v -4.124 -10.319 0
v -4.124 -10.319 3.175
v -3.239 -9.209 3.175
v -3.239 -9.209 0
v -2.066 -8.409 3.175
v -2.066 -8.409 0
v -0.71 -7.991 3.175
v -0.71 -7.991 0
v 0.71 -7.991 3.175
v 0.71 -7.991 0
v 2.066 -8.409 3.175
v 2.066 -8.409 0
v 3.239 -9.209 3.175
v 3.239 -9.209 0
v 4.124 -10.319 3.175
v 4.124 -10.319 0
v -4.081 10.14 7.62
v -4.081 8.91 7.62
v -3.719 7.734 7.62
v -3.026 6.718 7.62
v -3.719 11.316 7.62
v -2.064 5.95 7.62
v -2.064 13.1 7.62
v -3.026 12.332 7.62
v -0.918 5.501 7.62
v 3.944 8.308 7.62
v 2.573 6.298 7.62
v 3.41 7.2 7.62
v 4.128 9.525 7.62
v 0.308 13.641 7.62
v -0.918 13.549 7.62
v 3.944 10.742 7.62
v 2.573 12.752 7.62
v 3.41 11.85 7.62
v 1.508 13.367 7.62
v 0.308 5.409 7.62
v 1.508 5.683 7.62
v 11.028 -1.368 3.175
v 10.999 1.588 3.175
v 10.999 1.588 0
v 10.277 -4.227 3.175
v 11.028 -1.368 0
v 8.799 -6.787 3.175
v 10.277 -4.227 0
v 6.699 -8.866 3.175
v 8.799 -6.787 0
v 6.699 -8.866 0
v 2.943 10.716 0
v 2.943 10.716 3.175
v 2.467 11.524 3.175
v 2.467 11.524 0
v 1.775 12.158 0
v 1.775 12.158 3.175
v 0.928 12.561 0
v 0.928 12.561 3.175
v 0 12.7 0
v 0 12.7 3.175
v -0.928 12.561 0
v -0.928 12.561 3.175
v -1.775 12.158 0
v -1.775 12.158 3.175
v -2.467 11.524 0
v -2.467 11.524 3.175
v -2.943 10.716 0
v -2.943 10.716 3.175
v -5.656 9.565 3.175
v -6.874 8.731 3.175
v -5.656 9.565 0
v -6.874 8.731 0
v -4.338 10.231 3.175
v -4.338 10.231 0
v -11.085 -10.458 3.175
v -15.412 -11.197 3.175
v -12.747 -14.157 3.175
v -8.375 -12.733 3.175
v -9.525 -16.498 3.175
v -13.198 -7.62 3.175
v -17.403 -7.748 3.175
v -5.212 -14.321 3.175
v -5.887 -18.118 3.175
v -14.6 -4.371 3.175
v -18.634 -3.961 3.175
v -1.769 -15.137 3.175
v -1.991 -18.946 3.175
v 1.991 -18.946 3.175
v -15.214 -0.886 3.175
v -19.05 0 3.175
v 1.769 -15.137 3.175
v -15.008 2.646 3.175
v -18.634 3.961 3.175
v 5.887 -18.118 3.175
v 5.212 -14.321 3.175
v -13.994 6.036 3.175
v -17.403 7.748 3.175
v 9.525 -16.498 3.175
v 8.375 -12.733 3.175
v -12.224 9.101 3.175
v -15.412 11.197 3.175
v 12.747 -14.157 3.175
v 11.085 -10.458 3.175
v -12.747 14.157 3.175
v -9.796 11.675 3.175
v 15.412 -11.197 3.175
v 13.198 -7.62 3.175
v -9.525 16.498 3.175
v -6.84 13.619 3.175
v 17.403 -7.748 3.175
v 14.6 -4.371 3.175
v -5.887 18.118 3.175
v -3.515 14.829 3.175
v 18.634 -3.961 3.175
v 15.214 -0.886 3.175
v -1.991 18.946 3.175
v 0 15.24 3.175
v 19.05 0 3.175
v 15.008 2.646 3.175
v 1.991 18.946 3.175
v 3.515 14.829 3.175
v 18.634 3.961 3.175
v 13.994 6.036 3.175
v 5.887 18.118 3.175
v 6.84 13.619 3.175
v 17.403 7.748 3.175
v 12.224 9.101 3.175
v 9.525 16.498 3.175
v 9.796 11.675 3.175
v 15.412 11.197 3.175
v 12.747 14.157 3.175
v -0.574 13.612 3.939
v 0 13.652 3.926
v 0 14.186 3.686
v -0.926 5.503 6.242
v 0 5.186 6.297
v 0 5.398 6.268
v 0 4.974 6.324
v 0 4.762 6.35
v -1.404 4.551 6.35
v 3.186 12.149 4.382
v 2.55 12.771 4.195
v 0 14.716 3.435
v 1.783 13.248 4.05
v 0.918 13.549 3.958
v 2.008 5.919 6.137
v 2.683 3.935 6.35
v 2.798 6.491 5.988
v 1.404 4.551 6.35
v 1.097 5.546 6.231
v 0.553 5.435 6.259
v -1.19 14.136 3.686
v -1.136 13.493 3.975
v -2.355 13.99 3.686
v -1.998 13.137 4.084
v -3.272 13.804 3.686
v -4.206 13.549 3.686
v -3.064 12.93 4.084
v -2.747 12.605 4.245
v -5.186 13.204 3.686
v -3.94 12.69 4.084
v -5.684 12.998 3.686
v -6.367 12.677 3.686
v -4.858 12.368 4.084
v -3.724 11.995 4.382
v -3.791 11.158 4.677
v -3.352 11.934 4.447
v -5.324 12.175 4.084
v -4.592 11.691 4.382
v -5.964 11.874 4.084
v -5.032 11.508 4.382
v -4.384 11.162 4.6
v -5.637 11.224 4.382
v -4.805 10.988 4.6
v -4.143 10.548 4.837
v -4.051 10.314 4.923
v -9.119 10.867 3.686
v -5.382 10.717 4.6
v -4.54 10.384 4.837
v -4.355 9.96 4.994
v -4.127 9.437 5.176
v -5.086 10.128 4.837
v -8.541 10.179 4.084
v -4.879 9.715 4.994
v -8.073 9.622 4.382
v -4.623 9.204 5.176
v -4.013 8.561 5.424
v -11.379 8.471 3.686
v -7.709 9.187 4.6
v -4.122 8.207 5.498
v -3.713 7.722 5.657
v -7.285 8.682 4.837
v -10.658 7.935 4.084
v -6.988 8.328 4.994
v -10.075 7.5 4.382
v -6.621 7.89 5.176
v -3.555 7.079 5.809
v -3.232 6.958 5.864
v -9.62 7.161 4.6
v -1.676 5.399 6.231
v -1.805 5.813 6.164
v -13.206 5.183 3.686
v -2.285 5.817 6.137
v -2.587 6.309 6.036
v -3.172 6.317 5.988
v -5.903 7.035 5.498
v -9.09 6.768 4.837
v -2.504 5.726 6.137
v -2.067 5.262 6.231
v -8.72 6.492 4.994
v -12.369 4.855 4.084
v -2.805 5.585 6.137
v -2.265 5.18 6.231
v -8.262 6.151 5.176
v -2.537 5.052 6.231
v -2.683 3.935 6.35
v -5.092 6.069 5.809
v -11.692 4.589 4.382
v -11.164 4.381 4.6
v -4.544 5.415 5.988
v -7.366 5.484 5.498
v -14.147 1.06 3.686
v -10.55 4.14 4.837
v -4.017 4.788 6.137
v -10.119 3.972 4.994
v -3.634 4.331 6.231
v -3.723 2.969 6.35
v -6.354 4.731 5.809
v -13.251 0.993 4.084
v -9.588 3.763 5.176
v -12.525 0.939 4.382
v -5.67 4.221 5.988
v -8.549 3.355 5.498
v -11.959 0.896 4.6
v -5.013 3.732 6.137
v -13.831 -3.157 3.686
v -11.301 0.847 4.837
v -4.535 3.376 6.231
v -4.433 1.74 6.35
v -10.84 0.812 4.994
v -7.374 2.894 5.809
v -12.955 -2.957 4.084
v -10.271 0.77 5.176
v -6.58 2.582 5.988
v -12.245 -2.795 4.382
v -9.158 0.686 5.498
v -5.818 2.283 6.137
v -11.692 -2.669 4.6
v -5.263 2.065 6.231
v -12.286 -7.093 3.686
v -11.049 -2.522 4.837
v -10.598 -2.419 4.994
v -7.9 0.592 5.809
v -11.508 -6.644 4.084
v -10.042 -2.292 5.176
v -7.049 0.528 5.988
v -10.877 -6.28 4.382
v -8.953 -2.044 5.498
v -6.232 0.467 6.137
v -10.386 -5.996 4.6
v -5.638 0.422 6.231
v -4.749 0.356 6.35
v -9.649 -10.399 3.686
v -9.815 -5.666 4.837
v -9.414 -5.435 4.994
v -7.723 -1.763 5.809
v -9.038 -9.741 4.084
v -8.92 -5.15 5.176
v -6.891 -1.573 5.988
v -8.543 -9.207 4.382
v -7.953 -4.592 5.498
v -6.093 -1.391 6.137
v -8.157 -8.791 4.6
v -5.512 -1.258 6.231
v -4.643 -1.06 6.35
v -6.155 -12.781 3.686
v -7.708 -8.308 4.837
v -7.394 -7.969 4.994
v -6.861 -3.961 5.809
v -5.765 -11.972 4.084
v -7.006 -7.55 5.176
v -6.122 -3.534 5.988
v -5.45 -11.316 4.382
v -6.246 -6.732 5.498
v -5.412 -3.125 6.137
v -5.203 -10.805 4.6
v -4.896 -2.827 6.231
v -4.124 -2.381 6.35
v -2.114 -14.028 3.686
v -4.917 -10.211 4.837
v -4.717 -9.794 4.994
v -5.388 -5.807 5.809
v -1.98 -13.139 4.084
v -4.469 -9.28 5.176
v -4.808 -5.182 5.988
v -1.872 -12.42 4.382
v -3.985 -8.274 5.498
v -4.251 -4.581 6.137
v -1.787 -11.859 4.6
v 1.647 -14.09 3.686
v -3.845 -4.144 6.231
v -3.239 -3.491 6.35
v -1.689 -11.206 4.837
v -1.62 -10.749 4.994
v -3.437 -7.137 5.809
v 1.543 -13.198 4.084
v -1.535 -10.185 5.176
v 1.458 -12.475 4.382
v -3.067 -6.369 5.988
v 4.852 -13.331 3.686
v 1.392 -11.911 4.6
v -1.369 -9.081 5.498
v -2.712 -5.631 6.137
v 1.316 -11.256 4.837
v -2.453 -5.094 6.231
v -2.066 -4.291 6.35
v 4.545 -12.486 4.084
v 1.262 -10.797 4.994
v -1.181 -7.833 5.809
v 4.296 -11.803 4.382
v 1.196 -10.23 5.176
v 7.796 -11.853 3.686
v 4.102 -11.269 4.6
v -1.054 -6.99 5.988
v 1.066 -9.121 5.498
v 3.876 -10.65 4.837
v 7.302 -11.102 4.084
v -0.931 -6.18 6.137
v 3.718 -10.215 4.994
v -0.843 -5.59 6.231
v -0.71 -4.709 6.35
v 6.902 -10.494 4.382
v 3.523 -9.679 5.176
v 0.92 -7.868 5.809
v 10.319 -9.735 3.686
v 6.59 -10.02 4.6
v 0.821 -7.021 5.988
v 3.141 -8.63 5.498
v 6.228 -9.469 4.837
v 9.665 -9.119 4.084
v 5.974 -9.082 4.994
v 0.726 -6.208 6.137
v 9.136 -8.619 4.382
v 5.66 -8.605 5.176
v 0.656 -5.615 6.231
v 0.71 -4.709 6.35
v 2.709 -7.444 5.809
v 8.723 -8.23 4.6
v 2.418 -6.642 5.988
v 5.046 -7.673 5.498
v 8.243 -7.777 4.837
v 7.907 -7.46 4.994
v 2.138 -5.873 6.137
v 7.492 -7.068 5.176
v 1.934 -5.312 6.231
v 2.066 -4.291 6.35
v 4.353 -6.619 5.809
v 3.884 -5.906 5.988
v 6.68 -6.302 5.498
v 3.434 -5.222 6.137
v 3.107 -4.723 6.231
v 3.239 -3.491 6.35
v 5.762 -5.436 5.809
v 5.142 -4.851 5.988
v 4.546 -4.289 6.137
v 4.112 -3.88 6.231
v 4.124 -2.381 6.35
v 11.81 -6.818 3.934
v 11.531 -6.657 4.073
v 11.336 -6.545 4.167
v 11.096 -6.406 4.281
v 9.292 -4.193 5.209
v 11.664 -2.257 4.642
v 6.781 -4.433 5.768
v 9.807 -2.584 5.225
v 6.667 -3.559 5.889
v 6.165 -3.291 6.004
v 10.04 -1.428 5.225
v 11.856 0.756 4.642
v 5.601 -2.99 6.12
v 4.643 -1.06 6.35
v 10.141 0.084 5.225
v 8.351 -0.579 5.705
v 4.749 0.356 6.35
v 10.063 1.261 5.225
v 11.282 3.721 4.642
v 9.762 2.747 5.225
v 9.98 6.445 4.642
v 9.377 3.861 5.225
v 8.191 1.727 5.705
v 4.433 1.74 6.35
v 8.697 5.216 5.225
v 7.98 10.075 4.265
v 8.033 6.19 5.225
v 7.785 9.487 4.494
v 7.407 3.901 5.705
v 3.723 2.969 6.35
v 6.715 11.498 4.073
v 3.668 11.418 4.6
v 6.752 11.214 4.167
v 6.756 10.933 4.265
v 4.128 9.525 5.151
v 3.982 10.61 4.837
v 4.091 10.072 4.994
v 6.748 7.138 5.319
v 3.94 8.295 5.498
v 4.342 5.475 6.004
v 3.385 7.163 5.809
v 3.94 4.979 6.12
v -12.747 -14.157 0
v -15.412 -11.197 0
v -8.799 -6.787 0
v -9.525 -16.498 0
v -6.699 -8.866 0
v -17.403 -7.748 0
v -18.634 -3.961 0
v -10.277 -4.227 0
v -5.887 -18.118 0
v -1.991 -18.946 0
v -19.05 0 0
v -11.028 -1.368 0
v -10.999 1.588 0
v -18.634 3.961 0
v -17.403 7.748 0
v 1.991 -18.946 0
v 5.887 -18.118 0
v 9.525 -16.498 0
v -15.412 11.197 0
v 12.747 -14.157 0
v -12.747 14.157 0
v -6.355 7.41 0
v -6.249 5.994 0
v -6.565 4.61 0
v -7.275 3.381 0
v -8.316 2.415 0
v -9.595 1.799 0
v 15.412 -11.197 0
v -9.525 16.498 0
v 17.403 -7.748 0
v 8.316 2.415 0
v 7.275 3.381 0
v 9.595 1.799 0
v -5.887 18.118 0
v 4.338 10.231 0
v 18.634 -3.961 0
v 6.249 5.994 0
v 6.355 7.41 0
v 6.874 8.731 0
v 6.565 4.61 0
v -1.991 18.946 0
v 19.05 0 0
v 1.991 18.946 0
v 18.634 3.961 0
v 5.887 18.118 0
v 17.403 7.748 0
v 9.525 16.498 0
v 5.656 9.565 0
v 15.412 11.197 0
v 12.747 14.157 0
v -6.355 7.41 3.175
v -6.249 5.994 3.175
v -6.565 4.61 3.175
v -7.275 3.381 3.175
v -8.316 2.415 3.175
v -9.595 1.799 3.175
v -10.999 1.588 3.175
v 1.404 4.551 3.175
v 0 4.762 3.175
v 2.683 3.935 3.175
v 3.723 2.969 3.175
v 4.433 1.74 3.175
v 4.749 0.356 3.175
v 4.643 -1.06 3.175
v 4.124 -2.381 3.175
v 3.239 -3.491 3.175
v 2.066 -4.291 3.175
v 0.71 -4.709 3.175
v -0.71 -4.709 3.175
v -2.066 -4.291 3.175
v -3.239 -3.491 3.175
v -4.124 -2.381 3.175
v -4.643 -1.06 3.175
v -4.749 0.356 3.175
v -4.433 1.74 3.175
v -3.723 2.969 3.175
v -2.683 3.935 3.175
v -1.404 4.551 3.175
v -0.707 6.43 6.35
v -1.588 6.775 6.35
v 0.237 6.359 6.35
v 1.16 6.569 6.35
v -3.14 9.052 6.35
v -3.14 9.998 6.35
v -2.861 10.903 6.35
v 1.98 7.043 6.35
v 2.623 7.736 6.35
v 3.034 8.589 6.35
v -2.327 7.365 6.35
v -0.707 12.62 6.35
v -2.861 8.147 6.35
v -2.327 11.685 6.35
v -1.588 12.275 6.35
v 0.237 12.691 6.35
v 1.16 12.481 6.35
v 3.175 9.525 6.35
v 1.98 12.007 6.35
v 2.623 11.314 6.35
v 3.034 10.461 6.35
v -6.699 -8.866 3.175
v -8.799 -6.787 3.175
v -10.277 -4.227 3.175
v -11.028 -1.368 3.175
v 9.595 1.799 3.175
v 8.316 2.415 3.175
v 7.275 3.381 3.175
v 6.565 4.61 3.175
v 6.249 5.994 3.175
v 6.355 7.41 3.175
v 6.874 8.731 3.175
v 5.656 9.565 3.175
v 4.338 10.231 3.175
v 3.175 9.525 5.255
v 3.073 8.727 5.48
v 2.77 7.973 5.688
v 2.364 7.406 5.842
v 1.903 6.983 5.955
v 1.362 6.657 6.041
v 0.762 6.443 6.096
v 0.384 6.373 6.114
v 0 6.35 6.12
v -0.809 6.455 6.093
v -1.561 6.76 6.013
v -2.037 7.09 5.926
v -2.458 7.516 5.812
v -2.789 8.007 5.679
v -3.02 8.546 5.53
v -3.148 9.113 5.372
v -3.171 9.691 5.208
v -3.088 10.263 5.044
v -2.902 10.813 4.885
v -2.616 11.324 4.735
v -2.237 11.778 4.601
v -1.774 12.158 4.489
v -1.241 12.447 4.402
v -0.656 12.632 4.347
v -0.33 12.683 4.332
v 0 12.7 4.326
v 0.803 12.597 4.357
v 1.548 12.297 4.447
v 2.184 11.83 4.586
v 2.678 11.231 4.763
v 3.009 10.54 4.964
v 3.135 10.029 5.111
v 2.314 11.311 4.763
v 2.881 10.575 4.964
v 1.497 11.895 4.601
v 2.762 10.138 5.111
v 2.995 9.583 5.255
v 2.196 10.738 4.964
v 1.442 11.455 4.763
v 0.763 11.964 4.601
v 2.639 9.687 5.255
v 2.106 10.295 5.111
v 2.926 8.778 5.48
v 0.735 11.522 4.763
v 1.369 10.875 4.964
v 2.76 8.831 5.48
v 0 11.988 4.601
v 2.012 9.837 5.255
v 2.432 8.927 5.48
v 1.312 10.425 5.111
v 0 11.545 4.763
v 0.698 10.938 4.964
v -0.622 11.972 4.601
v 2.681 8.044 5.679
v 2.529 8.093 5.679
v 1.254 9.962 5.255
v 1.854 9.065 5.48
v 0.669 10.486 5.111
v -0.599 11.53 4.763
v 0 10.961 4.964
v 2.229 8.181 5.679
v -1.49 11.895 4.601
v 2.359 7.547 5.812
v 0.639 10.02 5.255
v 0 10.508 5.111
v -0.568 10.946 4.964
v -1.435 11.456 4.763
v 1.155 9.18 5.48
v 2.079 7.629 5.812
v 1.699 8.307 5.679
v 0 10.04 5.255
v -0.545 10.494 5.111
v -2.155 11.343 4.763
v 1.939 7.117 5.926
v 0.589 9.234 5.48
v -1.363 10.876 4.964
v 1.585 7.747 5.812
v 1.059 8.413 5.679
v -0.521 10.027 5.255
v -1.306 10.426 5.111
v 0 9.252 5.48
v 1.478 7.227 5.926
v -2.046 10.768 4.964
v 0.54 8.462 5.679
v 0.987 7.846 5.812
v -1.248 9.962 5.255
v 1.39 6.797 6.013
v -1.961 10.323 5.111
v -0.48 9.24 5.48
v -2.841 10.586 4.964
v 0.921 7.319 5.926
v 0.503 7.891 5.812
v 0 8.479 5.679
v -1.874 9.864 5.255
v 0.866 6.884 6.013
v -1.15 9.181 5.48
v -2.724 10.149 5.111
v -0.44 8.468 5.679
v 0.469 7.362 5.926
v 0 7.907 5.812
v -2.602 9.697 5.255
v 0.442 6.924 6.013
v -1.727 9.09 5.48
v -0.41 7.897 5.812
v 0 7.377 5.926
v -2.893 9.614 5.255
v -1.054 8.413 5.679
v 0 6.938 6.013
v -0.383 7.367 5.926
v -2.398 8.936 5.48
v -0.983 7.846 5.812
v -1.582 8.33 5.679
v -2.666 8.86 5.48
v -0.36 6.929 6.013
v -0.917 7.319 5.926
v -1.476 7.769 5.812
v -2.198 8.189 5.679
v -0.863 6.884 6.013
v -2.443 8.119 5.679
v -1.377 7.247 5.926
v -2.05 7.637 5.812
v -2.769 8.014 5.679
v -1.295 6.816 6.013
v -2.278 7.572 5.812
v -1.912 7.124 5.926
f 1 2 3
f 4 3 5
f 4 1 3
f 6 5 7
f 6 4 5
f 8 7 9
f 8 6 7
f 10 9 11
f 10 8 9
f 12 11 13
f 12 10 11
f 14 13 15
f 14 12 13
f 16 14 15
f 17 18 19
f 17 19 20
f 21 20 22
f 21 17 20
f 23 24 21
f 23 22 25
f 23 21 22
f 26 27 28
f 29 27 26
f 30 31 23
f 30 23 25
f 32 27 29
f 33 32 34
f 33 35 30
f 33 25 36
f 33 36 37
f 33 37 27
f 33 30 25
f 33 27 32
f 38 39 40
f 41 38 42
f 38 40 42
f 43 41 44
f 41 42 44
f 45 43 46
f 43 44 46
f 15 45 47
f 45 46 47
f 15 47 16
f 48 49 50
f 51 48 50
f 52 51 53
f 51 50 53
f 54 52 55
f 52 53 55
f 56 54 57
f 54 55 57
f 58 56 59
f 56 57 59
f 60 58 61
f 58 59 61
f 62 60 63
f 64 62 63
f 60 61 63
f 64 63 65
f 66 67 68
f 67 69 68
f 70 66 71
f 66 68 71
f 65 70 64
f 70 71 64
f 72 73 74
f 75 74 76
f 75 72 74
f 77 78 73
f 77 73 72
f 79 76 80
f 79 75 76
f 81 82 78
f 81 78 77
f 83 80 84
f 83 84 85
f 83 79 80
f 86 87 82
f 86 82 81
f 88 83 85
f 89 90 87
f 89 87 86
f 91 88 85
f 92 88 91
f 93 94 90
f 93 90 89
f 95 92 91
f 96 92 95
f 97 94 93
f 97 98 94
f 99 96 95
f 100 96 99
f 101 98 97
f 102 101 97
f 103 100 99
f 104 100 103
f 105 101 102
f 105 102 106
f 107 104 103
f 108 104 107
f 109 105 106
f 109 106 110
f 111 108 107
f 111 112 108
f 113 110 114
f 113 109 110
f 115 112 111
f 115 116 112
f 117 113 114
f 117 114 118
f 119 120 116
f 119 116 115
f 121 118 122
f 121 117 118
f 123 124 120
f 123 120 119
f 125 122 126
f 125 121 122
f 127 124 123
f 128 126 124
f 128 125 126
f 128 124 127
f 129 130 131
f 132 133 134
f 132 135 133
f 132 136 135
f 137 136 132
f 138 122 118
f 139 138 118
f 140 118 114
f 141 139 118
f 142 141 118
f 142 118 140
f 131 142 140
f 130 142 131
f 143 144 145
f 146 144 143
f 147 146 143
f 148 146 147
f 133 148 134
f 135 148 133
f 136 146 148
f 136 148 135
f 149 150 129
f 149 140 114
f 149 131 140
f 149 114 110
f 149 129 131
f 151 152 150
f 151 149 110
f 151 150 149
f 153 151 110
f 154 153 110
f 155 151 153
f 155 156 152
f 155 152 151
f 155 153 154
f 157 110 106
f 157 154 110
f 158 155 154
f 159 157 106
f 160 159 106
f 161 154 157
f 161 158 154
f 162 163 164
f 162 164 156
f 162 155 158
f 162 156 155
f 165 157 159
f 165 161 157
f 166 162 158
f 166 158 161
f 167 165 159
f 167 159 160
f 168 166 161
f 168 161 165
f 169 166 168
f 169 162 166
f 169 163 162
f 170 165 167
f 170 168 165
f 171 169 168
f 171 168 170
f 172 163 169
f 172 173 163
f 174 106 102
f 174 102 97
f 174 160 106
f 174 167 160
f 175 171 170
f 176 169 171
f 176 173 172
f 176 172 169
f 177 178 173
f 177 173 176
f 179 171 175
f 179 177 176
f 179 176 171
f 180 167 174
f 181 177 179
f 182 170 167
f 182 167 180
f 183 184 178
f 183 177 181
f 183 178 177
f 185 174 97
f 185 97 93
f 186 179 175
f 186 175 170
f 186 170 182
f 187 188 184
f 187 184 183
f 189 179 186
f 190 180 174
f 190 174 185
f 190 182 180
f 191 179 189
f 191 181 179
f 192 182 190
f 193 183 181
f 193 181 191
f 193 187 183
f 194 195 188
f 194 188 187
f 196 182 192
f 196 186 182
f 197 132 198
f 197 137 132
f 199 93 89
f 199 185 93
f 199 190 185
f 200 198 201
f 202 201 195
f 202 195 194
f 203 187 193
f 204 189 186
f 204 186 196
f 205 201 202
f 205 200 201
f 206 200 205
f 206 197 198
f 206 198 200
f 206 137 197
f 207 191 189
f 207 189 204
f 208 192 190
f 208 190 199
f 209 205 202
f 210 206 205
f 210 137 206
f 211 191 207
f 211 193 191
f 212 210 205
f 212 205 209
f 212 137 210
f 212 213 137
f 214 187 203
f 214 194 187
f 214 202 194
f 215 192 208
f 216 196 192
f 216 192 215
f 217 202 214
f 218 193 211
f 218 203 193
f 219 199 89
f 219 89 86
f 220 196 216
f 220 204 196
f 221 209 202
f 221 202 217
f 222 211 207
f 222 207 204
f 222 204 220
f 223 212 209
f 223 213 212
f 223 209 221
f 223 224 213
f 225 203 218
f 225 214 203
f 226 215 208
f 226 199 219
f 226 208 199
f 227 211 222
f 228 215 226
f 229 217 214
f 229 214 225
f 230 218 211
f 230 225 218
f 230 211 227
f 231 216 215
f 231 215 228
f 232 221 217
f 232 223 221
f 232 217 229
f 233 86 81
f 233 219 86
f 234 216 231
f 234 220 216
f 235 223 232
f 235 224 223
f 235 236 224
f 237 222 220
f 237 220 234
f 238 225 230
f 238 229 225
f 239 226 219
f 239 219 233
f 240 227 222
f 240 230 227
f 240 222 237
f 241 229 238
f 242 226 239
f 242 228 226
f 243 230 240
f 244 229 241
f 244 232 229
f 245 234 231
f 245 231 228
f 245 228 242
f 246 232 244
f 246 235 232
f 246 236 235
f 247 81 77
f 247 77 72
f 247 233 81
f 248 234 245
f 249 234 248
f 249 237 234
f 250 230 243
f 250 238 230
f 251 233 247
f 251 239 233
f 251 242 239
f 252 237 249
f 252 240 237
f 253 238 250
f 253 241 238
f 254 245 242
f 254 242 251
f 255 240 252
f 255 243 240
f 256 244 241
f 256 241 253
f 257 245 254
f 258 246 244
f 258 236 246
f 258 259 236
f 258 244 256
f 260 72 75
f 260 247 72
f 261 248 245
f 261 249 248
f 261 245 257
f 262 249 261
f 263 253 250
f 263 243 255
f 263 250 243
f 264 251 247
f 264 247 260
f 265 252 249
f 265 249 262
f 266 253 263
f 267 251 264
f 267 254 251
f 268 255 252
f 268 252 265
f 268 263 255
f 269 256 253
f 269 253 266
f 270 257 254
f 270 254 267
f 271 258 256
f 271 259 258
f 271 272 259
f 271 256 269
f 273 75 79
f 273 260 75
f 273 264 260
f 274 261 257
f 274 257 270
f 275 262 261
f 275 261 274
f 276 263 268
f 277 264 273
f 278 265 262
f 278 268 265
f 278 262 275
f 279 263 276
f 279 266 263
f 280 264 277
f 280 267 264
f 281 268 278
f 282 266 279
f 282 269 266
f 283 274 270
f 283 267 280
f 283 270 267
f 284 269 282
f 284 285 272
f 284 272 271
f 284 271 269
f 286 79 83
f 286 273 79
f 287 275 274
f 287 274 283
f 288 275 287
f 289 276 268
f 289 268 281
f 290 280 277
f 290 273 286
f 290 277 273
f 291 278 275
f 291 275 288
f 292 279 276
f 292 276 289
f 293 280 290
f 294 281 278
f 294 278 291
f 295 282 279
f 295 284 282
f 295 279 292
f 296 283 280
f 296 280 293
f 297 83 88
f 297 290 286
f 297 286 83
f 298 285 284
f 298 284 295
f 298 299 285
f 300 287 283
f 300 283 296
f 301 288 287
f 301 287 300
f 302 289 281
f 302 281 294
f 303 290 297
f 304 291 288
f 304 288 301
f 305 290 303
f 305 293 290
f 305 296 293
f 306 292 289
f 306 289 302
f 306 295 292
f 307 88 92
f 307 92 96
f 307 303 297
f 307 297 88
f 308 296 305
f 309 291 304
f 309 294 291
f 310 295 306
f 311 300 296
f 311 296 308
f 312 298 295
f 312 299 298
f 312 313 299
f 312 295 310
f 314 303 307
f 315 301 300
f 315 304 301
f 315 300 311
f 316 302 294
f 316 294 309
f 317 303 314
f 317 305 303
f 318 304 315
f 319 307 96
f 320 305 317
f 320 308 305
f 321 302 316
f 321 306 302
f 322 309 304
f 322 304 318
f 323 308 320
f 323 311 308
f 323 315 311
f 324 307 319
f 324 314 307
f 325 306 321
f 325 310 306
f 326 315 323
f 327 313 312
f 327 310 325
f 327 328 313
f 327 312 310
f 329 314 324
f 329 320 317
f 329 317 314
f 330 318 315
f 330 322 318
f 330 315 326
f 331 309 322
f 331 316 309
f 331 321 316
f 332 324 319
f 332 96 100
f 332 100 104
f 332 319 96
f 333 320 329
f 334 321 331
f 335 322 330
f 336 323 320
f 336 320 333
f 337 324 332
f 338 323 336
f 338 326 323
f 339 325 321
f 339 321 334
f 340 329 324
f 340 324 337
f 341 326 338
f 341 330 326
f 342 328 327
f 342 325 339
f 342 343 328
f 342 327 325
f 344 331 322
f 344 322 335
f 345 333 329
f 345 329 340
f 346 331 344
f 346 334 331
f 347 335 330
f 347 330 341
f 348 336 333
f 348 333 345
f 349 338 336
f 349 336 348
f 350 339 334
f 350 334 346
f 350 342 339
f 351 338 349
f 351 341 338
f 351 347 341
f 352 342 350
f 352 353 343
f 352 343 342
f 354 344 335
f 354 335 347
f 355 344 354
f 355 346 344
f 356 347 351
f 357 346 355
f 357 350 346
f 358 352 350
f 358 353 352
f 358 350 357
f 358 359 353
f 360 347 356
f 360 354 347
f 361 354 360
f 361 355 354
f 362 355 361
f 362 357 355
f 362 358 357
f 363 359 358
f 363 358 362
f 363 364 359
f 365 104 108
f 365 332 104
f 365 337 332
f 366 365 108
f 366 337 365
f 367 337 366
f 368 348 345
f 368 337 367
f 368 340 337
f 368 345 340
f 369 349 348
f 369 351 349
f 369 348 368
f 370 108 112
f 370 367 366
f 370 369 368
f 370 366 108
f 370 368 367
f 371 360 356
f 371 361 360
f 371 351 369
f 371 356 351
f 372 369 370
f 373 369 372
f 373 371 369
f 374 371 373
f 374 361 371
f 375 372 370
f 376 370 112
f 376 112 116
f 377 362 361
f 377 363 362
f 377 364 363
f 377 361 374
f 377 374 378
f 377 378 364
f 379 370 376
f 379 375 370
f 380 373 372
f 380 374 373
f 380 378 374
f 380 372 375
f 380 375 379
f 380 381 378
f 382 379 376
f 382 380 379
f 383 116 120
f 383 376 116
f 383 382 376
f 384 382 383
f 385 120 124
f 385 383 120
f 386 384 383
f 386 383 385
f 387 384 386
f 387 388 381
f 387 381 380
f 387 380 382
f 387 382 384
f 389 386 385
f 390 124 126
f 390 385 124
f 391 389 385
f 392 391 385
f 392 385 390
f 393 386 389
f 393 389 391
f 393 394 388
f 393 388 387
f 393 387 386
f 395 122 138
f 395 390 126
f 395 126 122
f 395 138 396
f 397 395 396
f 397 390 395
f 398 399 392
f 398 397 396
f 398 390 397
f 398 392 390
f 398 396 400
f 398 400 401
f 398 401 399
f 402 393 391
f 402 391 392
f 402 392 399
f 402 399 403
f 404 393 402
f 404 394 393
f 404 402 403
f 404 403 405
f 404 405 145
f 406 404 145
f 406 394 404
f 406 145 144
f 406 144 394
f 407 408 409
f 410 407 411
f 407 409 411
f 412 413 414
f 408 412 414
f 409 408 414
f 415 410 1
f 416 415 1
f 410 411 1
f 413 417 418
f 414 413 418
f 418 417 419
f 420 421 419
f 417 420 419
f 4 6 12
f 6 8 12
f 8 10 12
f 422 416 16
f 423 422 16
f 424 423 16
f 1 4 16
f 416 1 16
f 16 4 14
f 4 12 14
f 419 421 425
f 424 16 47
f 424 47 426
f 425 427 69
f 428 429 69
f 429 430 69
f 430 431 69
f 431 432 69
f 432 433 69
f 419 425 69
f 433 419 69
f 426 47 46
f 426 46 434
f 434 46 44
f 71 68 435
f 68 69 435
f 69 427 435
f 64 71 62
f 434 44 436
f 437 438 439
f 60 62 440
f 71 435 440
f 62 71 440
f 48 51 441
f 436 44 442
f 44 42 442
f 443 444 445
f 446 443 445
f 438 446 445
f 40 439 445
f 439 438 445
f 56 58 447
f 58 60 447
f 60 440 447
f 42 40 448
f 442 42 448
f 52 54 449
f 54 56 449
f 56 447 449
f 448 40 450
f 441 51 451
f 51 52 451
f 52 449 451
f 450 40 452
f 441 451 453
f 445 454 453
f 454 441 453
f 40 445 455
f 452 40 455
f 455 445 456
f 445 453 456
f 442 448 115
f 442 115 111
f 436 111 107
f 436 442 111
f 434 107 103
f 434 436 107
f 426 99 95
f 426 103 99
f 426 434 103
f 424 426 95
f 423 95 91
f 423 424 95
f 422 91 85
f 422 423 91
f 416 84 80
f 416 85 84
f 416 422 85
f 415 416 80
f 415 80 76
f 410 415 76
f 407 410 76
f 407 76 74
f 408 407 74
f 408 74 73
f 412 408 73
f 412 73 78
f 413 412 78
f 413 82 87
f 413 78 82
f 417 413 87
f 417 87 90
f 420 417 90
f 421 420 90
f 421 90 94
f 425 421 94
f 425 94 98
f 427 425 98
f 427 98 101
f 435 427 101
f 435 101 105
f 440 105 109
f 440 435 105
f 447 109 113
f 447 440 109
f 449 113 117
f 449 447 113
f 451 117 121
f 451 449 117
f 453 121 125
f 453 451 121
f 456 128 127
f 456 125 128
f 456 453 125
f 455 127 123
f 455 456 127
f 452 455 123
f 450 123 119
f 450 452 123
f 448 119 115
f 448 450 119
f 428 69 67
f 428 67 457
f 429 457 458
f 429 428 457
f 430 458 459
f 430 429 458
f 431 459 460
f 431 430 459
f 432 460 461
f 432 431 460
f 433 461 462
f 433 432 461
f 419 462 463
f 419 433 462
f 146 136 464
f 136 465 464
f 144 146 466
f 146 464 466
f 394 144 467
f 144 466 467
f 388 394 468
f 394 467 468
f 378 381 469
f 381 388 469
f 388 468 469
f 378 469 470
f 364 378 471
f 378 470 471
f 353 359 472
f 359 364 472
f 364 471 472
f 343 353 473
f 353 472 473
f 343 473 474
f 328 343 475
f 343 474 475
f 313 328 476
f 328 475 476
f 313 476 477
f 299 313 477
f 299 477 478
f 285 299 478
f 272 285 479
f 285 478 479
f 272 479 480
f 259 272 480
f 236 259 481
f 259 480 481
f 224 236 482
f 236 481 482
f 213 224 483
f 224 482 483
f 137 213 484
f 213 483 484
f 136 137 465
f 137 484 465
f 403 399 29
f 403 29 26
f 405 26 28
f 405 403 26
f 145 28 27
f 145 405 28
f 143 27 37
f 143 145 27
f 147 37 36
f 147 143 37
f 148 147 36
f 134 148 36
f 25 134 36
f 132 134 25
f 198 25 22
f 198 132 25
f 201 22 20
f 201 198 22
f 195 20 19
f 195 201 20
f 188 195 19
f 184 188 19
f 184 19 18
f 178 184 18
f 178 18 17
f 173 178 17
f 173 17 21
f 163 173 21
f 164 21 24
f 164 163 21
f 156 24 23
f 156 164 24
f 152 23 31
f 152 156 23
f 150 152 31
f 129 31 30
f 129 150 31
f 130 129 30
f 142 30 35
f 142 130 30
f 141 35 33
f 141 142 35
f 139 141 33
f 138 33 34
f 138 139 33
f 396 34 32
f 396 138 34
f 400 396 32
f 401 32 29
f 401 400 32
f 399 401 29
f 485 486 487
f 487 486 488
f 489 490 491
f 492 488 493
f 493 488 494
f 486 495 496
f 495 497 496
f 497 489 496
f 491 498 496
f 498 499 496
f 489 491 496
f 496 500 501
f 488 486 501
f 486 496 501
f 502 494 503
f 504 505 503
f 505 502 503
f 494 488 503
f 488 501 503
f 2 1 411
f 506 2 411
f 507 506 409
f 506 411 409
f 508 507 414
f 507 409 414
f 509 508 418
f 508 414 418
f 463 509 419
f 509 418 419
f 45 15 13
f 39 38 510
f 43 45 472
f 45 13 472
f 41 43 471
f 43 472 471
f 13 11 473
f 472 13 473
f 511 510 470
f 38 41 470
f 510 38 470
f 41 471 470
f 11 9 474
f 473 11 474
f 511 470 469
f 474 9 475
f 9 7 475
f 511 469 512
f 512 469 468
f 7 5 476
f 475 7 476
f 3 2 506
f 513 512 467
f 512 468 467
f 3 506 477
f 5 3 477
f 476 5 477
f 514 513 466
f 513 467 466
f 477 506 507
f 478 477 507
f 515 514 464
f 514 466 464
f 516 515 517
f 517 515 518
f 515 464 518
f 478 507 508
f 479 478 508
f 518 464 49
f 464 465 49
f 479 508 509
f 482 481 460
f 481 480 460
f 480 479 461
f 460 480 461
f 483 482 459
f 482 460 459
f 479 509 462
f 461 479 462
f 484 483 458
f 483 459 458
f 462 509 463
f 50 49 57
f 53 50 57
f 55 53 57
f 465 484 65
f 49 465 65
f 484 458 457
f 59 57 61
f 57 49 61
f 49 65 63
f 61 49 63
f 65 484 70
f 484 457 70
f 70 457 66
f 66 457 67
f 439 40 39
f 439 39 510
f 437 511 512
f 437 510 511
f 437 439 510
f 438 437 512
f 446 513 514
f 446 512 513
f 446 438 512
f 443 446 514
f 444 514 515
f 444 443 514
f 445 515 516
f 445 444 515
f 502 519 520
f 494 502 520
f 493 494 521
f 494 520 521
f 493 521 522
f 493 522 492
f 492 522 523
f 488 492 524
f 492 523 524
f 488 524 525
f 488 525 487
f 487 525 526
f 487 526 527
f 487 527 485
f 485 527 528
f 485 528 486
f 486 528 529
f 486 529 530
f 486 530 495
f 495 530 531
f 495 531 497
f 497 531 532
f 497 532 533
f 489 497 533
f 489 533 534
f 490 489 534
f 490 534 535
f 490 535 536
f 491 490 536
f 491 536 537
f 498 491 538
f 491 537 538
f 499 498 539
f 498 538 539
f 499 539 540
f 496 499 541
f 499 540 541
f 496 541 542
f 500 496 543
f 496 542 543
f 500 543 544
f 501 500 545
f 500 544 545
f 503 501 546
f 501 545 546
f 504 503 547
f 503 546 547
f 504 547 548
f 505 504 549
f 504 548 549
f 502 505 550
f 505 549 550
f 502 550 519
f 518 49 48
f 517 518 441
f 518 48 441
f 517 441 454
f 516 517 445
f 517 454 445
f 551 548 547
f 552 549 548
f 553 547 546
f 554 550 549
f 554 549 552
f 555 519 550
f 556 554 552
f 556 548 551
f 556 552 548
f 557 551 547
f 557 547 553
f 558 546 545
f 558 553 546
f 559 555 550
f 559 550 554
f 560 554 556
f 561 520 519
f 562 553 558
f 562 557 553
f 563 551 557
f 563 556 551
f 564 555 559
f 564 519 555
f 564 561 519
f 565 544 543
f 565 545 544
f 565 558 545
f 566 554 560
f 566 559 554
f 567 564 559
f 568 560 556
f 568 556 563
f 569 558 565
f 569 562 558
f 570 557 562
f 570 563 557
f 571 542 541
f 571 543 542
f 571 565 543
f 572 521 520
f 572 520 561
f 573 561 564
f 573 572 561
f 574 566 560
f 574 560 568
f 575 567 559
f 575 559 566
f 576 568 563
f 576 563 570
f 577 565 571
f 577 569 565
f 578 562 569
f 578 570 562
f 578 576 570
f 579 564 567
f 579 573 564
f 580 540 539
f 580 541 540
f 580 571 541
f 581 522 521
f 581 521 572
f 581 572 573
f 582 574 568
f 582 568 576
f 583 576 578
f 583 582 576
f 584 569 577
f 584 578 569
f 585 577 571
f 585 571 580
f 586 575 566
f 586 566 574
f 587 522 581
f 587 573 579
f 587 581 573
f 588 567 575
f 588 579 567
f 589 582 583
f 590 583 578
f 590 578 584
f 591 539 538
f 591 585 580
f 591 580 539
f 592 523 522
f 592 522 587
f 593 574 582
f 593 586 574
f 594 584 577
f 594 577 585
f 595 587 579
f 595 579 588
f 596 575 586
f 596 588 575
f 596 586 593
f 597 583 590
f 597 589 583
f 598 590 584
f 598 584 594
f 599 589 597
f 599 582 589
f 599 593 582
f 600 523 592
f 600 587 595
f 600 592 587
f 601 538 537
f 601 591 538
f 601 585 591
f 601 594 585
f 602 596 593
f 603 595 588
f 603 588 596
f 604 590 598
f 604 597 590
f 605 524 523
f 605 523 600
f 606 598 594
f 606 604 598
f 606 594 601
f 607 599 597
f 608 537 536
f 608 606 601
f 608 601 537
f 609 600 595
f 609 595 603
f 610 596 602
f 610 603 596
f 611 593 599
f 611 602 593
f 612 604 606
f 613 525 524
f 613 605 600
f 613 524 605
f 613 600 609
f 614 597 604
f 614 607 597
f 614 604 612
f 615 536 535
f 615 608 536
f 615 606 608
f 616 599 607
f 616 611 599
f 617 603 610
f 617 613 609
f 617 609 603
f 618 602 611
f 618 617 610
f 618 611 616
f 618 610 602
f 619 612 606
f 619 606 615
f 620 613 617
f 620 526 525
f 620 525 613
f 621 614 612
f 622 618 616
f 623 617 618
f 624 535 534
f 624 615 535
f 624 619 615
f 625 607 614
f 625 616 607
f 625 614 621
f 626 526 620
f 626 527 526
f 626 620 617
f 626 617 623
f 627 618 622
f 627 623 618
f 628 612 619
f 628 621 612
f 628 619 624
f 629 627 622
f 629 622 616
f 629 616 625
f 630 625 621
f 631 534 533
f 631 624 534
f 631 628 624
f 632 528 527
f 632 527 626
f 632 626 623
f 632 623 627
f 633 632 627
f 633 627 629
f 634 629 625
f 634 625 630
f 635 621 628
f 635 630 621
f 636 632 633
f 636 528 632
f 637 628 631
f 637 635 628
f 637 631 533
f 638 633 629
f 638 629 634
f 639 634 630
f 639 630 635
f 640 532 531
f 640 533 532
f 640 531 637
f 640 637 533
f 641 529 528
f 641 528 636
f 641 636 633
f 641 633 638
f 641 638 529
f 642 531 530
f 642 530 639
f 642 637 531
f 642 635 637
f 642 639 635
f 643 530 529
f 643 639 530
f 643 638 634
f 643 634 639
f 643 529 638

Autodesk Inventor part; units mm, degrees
ref_plane "YZ Plane" through (0, 0, 0) normal (1, 0, 0) x (0, 1, 0)
ref_plane "XZ Plane" through (0, 0, 0) normal (0, 1, 0) x (-1, 0, 0)
ref_plane "XY Plane" through (0, 0, 0) normal (0, 0, 1) x (1, 0, 0)
sketch "Sketch1" plane through (0, 0, 0) normal (0, 0, 1) x (1, 0, 0)
  circle A0 centre (0, 0) radius 19.05
  circle A1 centre (0, 0) radius 11.1125
  line L0 (0, 0) -> (0, -12.7)
  circle A2 centre (0, -12.7) radius 4.7625
  circle A3 centre (10.9985, 6.35) radius 4.7625
  circle A4 centre (-10.9985, 6.35) radius 4.7625
  dimension "d0" = 38.1
  dimension "d1" = 22.225
  dimension "d2" = 12.7
  dimension "d3" = 9.525
  dimension "d6" = 360
extrude "Extrusion1" add sketch "Sketch1" along normal blind 3.175 contours A0 | A3 A1 | A1 A3 | A2 A1 | A1 L0 A2 | A1 A2 L0 | A4 A1 | A1 A4
sketch "Sketch2" plane through (0, 0, 0) normal (1, 0, 0) x (0, 1, 0)
  line L0 (0, 0) -> (0, 19.3707)
  line L1 (19.05, 3.175) -> (-19.05, 3.175) projected
  line L2 (0, 3.175) -> (15.24, 3.175)
  line L3 (0, 3.175) -> (0, 6.35)
  line L4 (0, 6.35) -> (4.7625, 6.35)
  arc A0 (15.24, 3.175) -> (4.7625, 6.35) centre (1.074, -24.6976) ccw
  line L5 (4.7625, 6.35) -> (4.7625, 3.175)
  dimension "d10" = 15.24
  dimension "d11" = 3.175
  dimension "d12" = 4.7625
revolve "Revolution1" add sketch "Sketch2" angle 360 about axis through (0, 0, 3.175) along (0, 0, 1) contours L5 A0 L1
sketch "Sketch3" plane through (0, 0, 3.175) normal (0, 0, 1) x (1, 0, 0)
  line L0 (0, 0) -> (0, 9.525)
  circle A0 centre (0, 9.525) radius 3.175
  circle A1 centre (0, 9.525) radius 4.1275
  dimension "d14" = 9.525
  dimension "d15" = 6.35
  dimension "d16" = 8.255
extrude "Extrusion2" add sketch "Sketch3" along normal blind 3.175
sketch "Sketch4" plane through (0, 9.525, 6.35) normal (0, 0, 1) x (1, 0, 0)
  circle A0 centre (0, 0) radius 4.1275 projected
  point P0 (0, -9.525)
extrude "Extrusion3" add sketch "Sketch4" along normal blind 1.27
extrude "Extrusion4" cut sketch "Sketch3" against normal through all contours A0
properties part number "SpurGear" material "ABS Plastic"
